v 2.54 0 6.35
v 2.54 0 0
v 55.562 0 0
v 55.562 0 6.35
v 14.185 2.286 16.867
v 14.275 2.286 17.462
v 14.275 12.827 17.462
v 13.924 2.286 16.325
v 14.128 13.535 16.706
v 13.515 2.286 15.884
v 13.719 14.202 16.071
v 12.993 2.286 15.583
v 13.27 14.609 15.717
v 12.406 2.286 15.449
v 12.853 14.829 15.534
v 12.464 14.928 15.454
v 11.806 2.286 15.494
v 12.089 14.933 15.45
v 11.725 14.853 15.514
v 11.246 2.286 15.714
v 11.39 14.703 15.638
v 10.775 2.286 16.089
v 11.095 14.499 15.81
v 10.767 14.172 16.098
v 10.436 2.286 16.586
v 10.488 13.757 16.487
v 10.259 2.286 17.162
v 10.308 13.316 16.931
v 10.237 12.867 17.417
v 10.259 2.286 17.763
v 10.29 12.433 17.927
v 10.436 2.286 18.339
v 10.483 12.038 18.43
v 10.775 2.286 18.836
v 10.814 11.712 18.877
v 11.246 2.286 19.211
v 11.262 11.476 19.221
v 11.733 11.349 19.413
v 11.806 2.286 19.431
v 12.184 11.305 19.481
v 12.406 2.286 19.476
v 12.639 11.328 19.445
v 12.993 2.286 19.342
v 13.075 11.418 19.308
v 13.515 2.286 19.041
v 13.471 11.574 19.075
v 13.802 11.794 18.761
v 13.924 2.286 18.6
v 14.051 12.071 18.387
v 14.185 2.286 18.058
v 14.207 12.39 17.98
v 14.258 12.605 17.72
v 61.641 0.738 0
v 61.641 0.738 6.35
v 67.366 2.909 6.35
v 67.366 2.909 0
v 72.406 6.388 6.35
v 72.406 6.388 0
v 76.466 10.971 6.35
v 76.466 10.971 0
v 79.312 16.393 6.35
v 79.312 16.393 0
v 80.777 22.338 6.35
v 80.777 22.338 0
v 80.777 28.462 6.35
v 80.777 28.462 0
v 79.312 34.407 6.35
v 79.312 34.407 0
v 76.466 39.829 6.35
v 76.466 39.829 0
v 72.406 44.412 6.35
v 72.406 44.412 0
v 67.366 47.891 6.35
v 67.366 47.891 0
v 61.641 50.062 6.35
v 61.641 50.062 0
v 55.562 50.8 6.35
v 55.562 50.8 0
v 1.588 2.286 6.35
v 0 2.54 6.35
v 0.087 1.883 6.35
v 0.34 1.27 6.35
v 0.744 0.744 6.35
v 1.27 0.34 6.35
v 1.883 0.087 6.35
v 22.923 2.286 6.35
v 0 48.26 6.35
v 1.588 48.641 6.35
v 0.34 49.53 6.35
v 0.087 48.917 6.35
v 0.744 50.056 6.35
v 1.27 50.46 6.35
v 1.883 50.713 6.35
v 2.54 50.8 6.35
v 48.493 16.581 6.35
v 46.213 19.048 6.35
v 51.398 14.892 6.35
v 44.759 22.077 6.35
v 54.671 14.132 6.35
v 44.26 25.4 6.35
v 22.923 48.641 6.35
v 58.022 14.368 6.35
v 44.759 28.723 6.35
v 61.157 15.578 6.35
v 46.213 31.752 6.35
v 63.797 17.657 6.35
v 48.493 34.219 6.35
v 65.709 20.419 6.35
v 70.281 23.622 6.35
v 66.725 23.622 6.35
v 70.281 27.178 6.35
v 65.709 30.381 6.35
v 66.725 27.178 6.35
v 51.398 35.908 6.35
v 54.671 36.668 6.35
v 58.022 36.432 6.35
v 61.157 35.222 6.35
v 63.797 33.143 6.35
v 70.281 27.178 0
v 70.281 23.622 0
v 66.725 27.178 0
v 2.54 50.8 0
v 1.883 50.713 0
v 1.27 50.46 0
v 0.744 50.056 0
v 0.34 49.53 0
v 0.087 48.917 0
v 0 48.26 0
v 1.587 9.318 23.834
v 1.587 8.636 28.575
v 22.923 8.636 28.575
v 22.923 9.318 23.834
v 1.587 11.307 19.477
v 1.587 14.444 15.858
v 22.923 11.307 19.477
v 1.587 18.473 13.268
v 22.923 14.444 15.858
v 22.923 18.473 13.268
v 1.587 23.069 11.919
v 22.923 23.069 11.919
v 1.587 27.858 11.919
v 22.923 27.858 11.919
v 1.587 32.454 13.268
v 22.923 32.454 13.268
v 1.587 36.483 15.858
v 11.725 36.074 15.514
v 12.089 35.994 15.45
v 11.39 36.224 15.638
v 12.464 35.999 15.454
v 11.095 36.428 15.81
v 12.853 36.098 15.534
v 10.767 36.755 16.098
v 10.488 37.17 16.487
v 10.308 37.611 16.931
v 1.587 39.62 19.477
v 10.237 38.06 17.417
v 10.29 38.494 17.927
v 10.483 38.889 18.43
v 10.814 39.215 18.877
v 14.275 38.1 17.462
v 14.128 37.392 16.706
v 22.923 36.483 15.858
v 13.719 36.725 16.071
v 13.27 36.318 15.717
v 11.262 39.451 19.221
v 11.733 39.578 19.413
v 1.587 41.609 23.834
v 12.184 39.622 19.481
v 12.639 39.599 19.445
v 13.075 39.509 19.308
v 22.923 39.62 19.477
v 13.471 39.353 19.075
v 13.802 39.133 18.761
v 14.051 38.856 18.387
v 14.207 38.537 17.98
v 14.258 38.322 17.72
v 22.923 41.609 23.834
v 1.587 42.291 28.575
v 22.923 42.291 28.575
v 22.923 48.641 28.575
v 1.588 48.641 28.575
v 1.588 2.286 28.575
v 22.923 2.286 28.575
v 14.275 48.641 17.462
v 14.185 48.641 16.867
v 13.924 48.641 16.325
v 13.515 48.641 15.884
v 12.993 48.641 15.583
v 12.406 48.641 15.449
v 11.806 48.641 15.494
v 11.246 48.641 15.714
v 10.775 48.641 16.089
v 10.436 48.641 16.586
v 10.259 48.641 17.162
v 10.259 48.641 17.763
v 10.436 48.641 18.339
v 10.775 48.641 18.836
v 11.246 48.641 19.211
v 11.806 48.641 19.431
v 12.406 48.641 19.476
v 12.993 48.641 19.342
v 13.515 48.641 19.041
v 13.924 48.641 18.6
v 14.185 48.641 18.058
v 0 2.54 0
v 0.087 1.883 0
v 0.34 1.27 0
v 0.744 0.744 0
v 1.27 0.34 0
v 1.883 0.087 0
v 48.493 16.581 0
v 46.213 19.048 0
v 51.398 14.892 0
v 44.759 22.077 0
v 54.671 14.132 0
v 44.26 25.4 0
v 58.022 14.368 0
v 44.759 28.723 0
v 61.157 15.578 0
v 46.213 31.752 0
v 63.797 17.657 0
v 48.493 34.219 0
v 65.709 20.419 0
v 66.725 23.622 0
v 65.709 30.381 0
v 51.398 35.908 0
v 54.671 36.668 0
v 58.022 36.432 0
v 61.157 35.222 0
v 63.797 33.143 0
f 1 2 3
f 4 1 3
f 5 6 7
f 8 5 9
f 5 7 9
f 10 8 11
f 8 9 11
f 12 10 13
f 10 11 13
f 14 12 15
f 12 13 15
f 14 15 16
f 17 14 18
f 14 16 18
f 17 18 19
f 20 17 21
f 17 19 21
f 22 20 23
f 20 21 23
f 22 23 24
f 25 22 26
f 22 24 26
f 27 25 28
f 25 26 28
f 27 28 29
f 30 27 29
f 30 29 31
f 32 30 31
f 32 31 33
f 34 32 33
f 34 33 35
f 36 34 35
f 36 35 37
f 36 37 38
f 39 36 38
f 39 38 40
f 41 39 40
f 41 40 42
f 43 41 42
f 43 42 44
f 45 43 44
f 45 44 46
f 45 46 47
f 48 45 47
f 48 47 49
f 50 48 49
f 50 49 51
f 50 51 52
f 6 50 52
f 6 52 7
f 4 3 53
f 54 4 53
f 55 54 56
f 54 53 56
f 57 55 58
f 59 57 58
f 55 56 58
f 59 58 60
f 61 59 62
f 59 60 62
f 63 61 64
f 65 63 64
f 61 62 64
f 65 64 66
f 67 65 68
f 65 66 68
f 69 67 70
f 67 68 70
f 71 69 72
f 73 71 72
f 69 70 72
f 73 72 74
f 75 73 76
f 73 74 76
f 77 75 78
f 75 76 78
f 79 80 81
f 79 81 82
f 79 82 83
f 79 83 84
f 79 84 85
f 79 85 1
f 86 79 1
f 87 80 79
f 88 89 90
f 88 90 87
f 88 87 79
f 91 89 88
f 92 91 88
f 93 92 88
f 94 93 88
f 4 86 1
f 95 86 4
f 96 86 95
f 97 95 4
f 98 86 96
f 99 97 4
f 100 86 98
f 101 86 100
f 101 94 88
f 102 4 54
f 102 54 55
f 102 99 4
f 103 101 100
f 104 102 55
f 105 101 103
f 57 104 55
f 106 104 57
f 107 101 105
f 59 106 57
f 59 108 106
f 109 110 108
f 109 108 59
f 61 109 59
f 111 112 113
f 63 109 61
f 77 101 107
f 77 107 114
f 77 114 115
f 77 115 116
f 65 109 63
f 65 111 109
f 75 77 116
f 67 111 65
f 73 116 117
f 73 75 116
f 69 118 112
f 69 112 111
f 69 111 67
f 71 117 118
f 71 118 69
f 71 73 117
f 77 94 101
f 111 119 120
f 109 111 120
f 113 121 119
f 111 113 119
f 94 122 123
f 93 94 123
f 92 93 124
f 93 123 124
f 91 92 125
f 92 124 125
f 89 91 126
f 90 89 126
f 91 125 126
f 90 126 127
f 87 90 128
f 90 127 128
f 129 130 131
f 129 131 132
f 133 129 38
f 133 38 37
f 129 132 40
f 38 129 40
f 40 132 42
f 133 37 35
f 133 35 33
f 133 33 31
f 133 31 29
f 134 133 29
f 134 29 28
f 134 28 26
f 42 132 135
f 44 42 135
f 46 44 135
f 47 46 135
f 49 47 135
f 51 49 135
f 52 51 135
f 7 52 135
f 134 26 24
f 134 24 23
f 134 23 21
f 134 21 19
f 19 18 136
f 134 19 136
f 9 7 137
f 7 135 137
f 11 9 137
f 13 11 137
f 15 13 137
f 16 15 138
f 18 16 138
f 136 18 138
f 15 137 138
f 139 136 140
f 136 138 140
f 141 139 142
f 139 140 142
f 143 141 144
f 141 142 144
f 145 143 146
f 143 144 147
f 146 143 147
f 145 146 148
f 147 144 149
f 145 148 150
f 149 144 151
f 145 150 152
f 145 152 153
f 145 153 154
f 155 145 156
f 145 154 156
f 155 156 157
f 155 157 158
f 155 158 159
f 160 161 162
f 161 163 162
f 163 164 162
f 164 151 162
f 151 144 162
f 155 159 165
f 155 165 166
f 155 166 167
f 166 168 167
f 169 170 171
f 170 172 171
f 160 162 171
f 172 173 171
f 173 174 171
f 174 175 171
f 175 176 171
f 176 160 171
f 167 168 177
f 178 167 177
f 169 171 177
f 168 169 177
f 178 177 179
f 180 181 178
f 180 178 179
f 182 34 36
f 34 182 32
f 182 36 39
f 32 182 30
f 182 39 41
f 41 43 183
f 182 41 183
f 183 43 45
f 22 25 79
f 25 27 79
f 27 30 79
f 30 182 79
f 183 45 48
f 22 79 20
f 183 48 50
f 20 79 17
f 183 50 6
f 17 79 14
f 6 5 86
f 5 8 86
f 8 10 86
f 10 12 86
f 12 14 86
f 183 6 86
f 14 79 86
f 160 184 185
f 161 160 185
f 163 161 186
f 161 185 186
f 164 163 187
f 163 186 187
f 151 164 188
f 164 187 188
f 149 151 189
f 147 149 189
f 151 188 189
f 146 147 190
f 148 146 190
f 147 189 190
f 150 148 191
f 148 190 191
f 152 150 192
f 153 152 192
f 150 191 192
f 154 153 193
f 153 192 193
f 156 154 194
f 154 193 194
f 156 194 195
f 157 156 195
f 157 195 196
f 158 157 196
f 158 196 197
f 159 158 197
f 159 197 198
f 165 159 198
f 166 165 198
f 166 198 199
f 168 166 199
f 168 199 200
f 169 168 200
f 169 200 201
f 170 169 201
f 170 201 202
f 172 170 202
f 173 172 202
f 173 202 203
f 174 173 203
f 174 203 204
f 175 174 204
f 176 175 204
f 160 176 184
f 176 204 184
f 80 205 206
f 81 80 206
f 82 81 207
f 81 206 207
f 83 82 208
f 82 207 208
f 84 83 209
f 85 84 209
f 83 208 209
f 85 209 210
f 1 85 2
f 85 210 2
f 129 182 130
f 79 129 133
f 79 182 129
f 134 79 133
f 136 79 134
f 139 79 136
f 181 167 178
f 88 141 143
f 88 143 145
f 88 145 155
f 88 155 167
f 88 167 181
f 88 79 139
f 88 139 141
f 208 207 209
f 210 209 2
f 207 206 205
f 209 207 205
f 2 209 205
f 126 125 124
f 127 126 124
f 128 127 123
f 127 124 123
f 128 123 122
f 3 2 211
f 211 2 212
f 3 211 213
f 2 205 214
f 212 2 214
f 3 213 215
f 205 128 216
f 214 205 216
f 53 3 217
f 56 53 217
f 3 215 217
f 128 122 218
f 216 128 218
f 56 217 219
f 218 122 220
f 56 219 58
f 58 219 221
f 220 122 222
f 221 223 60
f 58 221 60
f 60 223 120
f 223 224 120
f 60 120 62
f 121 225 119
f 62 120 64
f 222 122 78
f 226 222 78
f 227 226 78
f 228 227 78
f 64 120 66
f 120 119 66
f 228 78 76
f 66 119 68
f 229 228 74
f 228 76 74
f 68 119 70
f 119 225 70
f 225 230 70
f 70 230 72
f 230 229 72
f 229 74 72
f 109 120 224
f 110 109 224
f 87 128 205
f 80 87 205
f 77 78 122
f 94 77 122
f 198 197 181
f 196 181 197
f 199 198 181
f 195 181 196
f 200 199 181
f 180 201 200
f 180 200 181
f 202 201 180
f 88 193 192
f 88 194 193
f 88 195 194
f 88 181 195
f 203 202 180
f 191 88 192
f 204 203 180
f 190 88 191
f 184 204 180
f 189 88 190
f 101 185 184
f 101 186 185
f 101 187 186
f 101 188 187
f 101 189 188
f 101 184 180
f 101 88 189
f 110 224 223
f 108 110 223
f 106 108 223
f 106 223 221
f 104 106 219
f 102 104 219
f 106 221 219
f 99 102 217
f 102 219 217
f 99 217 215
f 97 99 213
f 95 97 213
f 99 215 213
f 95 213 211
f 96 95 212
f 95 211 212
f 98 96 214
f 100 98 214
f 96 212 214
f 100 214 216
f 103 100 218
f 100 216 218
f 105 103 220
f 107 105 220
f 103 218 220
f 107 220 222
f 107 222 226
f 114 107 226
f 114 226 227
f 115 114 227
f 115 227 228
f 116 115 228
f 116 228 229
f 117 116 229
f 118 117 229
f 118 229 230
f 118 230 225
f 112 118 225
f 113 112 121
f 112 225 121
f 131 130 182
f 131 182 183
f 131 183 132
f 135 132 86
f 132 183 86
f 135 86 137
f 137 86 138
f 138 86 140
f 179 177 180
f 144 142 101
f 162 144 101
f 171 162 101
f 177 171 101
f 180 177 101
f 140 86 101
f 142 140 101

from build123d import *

# Parameters (mm, degrees)
BOSS_EXTRUDE1_DEPTH         = 6.35
SKETCH2_W                   = 21.336
SKETCH2_H                   = 46.355
BOSS_EXTRUDE2_DEPTH         = 22.225
CUT_EXTRUDE1_DEPTH          = 99.476196362
CUT_EXTRUDE1_DEPTH_BACK     = 57.531
F_10_32_TAPPED_HOLE1_REACH  = 100.678
F_10_32_TAPPED_HOLE1_BORE_R = 2.0193
F_10_32_TAPPED_HOLE2_D      = 4.0386


with BuildPart() as part:
    # Sketch1 → Boss-Extrude1 (new body)
    with BuildSketch(Plane.XY):
        with BuildLine():
            Line((2.54, 0), (55.5625, 0))
            ThreePointArc((55.5625, 0), (80.9625, 25.4), (55.5625, 50.8))
            Line((55.5625, 50.8), (2.54, 50.8))
            ThreePointArc((2.54, 50.8), (0.743948776, 50.056051224), (0, 48.26))
            Line((0, 48.26), (0, 2.54))
            ThreePointArc((0, 2.54), (0.743948776, 0.743948776), (2.54, 0))
        make_face()
        with BuildLine():
            Line((66.724781353, 27.178), (70.280781353, 27.178))
            Line((70.280781353, 27.178), (70.280781353, 23.622))
            Line((70.280781353, 23.622), (66.724781353, 23.622))
            ThreePointArc((66.724781353, 23.622), (44.2595, 25.4), (66.724781353, 27.178))
        make_face(mode=Mode.SUBTRACT)
    extrude(amount=BOSS_EXTRUDE1_DEPTH)

    # Sketch2 → Boss-Extrude2 (add)
    with BuildSketch(Plane.XY.offset(6.35)):
        with Locations((12.2555, 25.4635)):
            Rectangle(SKETCH2_W, SKETCH2_H)
    extrude(amount=BOSS_EXTRUDE2_DEPTH)

    # Sketch3 → Cut-Extrude1 (cut, two sides: drawn at the far end of the back side and taken through both)
    with BuildSketch(Plane.ZY.offset(-1.5875).offset(-CUT_EXTRUDE1_DEPTH_BACK)):
        with BuildLine():
            Line((140.654563204, 8.636), (28.575, 8.636))
            ThreePointArc((28.575, 8.636), (11.7475, 25.4635), (28.575, 42.291))
            Line((28.575, 42.291), (140.654563204, 42.291))
            Line((140.654563204, 42.291), (364.813689613, 42.291))
            Line((364.813689613, 42.291), (364.813689613, 8.636))
            Line((364.813689613, 8.636), (140.654563204, 8.636))
        make_face()
    extrude(amount=CUT_EXTRUDE1_DEPTH + CUT_EXTRUDE1_DEPTH_BACK, mode=Mode.SUBTRACT)

    # #10-32 Tapped Hole1 bore → #10-32 Tapped Hole1 (cut, up to next)
    with BuildSketch(Plane(origin=(0, 48.641, 0), x_dir=(1, 0, 0), z_dir=(0, 1, 0)), mode=Mode.PRIVATE) as f_10_32_tapped_hole1_sk1:
        with Locations((12.2555, -17.4625)):
            Circle(F_10_32_TAPPED_HOLE1_BORE_R)
    f_10_32_tapped_hole1_tool1 = extrude(f_10_32_tapped_hole1_sk1.sketch, amount=-F_10_32_TAPPED_HOLE1_REACH, mode=Mode.PRIVATE) & part.part
    add(f_10_32_tapped_hole1_tool1.solids().sort_by_distance((12.2555, 48.641, 17.4625))[0], mode=Mode.SUBTRACT)

    # #10-32 Tapped Hole2 (through all)
    with Locations(Plane(origin=(0, 2.286, 0), x_dir=(-1, 0, 0), z_dir=(0, -1, 0))):
        with Locations((-12.2555, -17.4625)):
            Hole(F_10_32_TAPPED_HOLE2_D / 2)


solid = part.part
